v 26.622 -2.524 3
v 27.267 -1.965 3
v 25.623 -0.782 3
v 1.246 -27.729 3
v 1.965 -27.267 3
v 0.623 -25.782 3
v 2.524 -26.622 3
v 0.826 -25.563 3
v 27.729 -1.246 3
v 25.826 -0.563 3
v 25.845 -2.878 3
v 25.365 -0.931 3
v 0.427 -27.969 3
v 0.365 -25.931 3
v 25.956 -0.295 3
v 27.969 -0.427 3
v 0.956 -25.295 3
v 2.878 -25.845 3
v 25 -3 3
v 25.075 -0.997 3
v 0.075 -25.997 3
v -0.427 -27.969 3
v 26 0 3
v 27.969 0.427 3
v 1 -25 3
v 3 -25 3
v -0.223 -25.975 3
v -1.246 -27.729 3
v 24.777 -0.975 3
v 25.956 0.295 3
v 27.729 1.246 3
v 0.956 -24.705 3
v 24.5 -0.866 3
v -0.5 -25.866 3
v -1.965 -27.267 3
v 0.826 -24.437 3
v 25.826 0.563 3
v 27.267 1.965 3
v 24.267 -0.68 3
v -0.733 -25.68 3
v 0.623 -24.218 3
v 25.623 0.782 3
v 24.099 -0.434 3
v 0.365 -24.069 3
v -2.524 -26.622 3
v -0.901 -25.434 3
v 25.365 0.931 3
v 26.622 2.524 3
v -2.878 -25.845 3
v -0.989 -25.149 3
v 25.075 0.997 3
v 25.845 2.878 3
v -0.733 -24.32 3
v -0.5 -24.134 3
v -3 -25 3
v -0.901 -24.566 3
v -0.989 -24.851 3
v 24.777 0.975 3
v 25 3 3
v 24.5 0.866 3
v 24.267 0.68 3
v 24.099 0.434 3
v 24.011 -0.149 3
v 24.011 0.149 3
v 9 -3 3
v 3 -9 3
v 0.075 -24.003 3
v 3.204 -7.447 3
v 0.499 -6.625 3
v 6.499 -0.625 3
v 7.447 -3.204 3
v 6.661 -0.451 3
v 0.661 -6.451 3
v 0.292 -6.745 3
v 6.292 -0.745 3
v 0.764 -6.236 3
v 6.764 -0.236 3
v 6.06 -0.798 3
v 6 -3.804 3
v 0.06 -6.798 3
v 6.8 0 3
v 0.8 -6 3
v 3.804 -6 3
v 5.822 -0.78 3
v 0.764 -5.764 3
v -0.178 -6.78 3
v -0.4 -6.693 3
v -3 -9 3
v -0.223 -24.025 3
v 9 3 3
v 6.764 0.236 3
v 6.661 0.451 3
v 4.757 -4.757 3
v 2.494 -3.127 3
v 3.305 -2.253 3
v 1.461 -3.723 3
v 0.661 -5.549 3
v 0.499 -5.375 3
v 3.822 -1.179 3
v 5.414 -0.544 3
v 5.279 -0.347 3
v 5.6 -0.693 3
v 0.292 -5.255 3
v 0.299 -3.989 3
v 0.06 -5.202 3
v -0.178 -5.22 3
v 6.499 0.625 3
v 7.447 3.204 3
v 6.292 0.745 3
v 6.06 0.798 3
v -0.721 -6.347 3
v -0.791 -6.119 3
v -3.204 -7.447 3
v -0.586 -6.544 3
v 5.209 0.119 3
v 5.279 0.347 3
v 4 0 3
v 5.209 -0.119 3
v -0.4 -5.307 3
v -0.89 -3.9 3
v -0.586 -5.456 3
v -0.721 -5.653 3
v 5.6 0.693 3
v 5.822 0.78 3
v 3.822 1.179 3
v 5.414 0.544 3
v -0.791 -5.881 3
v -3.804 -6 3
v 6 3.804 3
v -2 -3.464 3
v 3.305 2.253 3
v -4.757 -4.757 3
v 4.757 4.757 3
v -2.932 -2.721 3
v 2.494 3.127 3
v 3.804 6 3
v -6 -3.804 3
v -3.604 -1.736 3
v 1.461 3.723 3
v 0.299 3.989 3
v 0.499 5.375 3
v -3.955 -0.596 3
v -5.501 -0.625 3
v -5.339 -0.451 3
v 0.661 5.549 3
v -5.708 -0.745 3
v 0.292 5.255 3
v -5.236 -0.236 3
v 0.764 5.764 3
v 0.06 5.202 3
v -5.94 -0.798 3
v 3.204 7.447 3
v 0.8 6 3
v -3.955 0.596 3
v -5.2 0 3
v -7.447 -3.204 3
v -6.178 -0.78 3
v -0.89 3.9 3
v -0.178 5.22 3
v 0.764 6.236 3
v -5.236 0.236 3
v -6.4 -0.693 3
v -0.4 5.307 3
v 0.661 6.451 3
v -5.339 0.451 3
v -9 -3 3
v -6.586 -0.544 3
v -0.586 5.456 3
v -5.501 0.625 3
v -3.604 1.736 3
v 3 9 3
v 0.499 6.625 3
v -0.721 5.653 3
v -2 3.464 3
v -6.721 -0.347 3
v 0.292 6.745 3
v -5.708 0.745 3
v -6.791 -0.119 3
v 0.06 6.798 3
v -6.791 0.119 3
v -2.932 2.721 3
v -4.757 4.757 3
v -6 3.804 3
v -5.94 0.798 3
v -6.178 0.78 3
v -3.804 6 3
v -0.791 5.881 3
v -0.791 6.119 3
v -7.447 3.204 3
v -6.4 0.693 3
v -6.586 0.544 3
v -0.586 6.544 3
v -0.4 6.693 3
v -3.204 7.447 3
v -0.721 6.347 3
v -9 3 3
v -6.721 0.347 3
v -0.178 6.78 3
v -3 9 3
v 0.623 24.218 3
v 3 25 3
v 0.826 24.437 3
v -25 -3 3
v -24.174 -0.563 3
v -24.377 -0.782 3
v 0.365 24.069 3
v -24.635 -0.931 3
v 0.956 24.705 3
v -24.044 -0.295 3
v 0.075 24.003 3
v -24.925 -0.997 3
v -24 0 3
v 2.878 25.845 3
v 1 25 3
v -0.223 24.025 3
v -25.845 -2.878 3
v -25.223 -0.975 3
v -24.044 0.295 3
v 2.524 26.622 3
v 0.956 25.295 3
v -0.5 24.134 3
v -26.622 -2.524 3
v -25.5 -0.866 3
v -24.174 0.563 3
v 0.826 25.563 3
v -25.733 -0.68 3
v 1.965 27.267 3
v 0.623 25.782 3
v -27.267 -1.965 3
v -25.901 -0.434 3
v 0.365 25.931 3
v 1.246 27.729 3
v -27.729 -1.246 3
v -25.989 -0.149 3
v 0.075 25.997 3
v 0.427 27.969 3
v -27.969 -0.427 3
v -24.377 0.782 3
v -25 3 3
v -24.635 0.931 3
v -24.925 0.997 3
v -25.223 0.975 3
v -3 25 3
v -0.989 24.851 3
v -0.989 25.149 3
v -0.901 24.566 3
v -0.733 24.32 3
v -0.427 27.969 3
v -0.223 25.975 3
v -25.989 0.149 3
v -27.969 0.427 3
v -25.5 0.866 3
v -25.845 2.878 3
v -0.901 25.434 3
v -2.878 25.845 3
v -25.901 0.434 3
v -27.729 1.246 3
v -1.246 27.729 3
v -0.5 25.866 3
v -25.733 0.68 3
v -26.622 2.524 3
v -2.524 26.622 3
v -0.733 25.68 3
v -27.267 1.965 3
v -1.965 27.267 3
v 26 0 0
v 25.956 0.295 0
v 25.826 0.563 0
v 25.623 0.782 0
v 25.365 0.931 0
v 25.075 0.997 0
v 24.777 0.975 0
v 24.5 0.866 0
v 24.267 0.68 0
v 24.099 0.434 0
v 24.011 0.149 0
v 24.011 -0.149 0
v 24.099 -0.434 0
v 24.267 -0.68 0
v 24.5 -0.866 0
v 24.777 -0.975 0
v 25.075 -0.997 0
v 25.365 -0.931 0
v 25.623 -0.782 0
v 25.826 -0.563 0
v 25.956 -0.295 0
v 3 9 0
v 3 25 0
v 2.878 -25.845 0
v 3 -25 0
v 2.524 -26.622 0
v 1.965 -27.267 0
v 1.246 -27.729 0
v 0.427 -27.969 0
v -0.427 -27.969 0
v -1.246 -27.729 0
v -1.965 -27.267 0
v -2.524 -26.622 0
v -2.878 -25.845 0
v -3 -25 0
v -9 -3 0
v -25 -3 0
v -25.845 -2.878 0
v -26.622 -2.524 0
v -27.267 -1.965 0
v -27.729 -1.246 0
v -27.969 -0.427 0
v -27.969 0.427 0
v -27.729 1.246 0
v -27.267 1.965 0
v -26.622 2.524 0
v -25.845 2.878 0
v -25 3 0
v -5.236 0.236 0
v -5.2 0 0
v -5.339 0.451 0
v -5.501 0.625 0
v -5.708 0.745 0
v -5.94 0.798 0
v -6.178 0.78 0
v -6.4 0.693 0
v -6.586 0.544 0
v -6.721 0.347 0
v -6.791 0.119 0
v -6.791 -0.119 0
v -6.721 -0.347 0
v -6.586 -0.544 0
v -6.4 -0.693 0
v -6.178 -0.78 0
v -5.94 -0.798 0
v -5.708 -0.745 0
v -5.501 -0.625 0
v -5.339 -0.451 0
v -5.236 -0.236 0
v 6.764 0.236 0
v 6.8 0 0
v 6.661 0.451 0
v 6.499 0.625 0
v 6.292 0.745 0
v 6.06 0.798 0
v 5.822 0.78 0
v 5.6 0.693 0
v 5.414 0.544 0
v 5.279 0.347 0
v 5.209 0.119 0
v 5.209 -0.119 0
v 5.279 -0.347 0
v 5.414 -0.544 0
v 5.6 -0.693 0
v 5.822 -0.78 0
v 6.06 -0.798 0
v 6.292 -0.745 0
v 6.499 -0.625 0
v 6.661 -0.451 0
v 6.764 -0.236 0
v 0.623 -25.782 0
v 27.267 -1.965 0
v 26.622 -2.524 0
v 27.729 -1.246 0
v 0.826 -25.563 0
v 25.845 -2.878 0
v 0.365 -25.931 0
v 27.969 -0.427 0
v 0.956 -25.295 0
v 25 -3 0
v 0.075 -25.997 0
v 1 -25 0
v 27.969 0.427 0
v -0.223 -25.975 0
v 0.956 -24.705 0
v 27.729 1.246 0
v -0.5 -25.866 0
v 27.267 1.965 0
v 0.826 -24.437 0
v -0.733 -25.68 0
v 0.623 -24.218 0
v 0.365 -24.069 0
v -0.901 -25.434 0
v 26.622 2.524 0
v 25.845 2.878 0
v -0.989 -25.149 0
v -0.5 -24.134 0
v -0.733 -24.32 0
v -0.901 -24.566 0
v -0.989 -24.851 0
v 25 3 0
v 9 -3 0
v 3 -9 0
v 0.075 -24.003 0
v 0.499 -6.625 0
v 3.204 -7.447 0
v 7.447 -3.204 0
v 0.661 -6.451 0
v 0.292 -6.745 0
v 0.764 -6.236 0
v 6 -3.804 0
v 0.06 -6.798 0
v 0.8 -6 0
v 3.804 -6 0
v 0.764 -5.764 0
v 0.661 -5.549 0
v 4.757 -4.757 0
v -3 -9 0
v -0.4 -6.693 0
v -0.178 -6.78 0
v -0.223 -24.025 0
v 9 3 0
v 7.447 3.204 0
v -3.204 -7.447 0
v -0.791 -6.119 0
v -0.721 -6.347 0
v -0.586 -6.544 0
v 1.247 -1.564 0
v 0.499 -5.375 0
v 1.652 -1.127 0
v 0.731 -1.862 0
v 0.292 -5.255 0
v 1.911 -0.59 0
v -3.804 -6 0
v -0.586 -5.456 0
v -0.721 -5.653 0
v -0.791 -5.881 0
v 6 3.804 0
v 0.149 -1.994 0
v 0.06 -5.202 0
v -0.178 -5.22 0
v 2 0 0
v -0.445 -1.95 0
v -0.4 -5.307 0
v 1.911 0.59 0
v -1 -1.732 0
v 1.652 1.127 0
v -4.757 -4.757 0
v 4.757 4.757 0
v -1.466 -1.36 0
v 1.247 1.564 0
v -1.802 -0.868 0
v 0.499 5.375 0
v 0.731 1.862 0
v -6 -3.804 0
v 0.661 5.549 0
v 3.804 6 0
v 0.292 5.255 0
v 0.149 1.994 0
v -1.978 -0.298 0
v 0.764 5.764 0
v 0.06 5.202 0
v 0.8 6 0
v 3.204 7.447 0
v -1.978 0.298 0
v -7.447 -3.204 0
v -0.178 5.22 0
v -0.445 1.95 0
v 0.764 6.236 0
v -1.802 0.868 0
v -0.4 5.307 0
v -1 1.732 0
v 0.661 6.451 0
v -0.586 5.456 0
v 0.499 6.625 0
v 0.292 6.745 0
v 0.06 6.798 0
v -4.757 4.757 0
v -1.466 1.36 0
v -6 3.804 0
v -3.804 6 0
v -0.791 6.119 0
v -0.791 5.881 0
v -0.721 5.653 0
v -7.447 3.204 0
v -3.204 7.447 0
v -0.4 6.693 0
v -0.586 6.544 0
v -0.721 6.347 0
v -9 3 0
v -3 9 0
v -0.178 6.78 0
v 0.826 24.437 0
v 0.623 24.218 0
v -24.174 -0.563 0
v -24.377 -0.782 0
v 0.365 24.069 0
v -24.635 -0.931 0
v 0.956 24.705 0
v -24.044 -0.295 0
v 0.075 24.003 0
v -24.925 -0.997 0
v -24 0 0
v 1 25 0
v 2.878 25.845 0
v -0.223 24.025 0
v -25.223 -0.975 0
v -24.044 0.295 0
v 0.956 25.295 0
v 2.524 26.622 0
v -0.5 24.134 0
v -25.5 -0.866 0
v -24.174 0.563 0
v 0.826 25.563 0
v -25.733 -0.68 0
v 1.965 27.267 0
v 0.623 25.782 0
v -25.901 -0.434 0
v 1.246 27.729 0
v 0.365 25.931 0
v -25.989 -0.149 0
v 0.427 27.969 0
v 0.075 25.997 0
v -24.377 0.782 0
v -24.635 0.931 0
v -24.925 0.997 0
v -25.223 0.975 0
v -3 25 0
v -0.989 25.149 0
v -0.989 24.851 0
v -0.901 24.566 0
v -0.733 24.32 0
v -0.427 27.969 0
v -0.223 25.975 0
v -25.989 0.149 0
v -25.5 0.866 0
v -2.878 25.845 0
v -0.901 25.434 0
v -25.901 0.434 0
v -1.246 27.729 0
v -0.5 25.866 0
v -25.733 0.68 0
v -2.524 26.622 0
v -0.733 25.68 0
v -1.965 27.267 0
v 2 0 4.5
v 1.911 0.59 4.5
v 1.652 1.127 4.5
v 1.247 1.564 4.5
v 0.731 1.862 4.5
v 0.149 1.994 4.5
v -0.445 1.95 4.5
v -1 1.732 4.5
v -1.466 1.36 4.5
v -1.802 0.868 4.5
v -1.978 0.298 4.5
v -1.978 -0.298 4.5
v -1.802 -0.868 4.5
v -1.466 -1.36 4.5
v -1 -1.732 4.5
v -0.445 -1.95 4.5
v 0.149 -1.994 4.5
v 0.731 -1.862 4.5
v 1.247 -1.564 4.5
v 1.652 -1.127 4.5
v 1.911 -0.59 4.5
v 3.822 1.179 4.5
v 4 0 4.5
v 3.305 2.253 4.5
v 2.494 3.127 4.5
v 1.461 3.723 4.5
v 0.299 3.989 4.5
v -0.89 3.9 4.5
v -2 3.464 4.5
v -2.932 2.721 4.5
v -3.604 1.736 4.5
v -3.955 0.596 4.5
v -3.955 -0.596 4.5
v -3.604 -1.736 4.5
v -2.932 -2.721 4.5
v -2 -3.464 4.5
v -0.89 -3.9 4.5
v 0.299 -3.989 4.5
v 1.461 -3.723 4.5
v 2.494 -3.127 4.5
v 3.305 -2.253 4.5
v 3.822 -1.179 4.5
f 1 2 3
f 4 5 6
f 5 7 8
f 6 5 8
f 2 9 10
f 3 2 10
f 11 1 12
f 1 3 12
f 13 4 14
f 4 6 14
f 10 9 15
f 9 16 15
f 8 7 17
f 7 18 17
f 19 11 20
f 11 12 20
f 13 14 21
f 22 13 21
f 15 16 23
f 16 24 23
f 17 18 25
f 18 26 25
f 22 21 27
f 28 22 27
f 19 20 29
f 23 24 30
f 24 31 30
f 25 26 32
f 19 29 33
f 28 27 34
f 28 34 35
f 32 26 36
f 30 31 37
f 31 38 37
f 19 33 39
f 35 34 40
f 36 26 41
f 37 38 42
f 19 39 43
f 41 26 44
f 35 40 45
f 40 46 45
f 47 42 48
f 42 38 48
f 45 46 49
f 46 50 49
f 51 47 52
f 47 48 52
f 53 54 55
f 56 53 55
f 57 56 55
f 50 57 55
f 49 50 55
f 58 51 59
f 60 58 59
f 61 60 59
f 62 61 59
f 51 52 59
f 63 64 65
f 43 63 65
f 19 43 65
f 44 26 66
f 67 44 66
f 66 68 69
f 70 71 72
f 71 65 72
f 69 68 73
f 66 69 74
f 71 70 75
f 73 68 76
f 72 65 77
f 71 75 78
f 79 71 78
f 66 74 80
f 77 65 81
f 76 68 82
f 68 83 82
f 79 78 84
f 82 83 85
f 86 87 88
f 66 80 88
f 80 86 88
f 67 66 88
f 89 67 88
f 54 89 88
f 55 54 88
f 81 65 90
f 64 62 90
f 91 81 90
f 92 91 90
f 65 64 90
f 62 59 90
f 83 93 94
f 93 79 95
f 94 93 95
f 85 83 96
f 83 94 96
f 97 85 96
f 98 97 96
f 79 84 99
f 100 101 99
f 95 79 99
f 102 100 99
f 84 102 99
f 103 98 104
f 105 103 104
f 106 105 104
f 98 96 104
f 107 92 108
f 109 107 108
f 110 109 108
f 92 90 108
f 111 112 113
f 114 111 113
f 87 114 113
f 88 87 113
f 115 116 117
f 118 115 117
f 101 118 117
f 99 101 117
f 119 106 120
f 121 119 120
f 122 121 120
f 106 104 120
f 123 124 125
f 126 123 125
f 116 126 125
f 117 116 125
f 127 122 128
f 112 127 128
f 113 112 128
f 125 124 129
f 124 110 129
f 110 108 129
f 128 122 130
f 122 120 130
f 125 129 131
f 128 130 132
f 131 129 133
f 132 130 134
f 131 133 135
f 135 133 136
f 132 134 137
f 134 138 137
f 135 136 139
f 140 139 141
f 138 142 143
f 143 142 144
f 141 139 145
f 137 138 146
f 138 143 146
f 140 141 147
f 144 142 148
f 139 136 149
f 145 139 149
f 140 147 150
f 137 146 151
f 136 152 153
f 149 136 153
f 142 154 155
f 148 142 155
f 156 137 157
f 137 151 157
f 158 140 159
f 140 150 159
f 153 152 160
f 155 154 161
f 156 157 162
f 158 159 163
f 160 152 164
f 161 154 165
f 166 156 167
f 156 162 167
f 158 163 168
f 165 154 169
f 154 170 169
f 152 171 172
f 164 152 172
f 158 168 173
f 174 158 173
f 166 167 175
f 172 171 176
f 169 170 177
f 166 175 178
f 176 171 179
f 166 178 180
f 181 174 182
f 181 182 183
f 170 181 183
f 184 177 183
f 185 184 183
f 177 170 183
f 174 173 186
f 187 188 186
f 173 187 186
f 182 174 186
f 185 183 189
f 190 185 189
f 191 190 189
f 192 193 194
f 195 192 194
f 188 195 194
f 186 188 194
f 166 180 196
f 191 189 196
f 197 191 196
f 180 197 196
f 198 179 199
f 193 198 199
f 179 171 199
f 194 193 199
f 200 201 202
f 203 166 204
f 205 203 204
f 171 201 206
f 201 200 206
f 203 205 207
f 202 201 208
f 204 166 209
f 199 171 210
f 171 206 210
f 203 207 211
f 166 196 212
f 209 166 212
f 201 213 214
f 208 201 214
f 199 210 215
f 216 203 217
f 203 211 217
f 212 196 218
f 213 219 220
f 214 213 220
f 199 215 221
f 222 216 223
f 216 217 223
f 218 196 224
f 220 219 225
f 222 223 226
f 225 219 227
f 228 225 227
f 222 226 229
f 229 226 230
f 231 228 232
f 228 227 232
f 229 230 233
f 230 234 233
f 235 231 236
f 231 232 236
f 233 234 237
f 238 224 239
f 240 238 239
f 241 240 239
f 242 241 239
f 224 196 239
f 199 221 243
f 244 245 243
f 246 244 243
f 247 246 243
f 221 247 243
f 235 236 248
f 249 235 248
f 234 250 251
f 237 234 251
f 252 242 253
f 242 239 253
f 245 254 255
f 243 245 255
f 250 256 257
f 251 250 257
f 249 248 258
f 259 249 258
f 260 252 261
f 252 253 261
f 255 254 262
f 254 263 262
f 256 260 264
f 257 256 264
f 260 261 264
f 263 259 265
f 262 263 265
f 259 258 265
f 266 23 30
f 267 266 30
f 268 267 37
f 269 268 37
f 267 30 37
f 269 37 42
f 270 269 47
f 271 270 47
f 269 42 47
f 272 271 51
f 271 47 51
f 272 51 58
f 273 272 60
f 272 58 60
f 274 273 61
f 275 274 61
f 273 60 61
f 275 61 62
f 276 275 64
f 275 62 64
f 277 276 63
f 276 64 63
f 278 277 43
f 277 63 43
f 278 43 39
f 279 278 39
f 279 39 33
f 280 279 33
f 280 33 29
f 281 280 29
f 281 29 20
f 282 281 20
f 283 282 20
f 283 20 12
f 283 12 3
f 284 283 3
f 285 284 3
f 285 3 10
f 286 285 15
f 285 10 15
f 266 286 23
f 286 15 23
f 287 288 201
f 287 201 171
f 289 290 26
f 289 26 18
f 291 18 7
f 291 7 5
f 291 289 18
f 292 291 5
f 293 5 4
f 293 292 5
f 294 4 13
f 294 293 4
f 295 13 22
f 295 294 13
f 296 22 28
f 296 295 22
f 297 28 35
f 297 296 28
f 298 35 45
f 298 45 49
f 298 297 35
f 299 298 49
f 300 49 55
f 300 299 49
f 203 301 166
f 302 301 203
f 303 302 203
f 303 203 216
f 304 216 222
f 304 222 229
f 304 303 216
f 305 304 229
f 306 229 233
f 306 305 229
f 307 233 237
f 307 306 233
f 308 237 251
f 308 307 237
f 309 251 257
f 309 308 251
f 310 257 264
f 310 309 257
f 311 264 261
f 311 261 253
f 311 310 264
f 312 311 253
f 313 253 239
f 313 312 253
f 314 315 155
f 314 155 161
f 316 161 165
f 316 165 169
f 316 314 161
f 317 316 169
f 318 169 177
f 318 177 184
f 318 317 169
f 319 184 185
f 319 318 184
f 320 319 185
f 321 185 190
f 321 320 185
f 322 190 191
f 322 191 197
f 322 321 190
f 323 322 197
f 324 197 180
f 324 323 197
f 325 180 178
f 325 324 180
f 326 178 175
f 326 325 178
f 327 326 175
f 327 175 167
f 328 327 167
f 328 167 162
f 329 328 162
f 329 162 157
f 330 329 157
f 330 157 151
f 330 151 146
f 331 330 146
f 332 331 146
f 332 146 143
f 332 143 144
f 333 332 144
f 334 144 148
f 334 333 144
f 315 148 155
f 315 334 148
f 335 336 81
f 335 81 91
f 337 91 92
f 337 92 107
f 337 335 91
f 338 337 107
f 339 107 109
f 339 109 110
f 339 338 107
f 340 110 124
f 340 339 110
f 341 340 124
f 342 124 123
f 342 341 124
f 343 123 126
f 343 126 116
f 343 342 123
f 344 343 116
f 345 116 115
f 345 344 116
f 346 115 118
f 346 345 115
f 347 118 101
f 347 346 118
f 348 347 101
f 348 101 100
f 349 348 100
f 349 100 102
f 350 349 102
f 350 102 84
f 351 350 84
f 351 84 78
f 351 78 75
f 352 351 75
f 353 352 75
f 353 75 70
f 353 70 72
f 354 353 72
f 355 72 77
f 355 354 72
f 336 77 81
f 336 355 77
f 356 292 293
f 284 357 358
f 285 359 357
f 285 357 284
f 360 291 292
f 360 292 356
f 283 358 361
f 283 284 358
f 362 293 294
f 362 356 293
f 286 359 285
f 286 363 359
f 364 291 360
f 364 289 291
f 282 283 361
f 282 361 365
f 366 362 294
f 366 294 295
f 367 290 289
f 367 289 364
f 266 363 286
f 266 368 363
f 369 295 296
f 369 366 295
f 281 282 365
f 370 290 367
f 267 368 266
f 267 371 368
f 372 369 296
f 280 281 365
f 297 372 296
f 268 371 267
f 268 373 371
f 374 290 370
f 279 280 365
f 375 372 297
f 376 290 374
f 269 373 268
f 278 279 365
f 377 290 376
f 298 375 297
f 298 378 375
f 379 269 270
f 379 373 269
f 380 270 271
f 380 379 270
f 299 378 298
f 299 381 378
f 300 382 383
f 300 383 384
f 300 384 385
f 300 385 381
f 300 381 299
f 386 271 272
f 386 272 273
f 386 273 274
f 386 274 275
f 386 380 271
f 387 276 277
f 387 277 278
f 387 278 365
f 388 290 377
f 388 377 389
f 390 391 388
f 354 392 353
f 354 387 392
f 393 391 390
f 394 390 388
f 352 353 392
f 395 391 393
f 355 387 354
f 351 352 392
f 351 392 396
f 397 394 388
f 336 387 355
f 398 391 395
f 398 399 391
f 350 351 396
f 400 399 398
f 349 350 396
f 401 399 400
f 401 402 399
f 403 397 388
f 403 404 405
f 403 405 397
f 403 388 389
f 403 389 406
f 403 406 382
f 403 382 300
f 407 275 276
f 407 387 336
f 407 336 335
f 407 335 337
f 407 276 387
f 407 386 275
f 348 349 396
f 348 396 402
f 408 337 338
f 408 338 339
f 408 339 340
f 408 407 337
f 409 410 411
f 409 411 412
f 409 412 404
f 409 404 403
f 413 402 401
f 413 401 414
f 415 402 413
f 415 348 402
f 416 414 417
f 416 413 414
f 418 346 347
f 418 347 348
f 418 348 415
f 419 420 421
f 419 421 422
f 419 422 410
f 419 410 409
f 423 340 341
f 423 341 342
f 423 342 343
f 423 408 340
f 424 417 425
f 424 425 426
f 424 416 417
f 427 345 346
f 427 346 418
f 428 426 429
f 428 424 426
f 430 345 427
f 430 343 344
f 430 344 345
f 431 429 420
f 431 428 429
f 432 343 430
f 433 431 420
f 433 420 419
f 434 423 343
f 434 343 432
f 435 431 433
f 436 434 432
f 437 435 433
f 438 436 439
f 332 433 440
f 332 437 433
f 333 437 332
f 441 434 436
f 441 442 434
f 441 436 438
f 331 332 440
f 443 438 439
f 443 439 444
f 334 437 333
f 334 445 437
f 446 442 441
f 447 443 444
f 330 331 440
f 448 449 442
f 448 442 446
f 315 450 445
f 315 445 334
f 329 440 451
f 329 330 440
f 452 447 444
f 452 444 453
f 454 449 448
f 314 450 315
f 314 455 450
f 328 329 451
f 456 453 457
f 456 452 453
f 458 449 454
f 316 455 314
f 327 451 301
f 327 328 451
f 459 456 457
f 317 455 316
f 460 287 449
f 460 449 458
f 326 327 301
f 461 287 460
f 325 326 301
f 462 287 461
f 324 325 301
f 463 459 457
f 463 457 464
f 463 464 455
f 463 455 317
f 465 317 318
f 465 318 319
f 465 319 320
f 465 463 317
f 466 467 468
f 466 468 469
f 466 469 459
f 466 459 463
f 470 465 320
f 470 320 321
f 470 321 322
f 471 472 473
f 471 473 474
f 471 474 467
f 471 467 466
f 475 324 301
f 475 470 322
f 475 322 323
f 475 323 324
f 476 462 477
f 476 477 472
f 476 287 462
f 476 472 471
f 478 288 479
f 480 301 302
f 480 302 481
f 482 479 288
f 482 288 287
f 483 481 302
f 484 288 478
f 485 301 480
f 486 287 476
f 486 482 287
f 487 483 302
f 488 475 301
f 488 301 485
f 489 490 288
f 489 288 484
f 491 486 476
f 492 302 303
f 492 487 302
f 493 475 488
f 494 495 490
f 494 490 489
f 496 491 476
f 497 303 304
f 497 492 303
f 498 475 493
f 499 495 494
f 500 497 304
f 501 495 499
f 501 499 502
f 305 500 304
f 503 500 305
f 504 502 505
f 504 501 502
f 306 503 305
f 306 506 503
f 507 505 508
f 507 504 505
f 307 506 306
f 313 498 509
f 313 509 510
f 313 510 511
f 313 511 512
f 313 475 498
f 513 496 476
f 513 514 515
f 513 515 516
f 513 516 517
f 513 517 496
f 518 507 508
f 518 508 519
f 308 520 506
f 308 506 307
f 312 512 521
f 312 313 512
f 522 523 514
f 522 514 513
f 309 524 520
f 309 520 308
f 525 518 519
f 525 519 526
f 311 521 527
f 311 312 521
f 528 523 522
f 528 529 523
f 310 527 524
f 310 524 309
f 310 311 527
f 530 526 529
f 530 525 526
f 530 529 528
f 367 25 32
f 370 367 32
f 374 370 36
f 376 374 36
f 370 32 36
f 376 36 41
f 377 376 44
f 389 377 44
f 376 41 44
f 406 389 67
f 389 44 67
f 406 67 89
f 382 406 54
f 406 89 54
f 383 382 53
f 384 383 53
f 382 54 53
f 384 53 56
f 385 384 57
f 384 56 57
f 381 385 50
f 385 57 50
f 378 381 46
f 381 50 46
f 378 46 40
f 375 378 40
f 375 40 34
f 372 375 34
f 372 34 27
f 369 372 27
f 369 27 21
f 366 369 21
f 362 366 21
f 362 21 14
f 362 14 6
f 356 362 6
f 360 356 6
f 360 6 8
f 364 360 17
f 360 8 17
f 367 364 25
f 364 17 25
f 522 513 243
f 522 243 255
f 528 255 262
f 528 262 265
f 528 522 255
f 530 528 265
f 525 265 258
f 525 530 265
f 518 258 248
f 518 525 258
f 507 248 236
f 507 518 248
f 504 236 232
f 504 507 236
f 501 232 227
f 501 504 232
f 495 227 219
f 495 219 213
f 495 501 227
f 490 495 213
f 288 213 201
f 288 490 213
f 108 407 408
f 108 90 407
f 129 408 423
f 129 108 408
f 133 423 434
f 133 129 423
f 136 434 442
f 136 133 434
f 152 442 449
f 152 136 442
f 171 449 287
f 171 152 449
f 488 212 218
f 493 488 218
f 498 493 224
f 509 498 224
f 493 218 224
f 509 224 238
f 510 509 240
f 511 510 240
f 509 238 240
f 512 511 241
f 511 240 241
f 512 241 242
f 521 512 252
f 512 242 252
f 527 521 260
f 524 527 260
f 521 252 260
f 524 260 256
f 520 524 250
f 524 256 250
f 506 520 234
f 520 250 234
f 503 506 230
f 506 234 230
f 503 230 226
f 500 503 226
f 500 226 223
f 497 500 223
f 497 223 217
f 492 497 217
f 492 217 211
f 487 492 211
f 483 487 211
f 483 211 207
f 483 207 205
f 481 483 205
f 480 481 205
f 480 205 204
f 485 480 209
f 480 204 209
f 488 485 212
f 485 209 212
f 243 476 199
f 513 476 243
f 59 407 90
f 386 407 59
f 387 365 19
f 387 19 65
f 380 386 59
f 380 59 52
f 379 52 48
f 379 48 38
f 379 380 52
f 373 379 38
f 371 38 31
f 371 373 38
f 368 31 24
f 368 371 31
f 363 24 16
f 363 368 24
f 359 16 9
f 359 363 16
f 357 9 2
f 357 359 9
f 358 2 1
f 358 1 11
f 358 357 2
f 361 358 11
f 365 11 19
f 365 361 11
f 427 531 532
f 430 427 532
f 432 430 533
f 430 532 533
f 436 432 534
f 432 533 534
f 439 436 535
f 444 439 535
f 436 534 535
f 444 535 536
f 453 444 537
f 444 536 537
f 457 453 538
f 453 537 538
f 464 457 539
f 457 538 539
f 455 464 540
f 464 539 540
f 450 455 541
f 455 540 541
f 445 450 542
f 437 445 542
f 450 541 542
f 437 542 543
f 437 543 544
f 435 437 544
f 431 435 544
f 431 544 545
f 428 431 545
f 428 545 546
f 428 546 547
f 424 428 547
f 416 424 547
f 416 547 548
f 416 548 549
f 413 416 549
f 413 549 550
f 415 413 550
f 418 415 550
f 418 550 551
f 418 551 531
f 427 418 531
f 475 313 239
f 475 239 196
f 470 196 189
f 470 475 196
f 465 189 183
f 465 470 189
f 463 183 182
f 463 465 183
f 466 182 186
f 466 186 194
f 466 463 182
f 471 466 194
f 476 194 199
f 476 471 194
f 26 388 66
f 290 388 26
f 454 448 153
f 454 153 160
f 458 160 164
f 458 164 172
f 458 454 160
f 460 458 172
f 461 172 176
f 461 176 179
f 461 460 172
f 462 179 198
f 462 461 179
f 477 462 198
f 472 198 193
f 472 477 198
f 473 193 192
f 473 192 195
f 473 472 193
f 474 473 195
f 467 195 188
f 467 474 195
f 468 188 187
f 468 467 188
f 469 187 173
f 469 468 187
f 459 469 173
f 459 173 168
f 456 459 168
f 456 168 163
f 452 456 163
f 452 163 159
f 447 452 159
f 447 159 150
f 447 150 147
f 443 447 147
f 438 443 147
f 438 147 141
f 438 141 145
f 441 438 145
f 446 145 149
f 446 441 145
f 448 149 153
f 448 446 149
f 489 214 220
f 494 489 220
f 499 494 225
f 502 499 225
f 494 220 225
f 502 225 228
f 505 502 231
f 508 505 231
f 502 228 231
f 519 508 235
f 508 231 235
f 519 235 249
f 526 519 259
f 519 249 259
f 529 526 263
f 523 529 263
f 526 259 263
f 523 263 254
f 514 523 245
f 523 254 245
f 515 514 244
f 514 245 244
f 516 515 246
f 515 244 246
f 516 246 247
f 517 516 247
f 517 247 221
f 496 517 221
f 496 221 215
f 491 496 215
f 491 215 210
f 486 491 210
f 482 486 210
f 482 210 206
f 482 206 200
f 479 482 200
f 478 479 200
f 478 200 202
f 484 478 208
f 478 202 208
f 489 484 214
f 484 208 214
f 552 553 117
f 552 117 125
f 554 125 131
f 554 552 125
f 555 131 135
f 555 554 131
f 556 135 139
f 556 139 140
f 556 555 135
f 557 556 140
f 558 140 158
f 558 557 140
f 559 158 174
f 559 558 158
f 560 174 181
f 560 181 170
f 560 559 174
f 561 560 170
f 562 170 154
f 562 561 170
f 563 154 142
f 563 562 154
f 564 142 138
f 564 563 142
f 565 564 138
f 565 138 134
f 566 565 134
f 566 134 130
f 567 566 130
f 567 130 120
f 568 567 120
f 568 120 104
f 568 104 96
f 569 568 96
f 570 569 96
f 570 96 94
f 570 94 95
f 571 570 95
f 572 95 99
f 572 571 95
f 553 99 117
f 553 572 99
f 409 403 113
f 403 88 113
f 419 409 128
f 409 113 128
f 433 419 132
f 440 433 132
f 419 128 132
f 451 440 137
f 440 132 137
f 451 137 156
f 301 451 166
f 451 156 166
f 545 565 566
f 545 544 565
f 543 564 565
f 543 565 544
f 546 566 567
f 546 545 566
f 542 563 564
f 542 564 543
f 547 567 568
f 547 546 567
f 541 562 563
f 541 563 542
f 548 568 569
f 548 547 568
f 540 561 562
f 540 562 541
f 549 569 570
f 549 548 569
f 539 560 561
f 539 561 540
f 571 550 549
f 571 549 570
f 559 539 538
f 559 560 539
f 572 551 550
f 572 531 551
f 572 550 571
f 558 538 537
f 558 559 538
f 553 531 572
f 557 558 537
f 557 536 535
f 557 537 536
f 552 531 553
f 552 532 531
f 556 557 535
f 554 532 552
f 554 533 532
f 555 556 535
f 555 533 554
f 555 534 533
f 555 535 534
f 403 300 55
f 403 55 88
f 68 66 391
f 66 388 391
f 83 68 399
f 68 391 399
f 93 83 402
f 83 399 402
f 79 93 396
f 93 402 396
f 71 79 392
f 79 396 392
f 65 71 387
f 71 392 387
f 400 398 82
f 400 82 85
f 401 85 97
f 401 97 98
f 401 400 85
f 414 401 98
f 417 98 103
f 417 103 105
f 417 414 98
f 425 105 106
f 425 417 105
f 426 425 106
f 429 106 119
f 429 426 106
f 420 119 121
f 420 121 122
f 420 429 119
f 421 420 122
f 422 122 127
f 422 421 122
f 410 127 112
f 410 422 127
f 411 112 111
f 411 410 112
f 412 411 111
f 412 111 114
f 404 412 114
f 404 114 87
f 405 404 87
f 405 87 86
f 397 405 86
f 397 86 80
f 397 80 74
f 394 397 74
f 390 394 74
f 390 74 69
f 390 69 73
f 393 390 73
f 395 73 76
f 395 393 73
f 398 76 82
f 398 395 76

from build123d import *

# Parameters (mm, degrees)
SKETCH1_R           = 0.8
BOSS_EXTRUDE1_DEPTH = 3
FILLET1_R           = 6
SKETCH2_R           = 2
CUT_EXTRUDE1_DEPTH  = 3
BOSS_EXTRUDE2_START = 1.5
SKETCH3_R           = 4
SKETCH3_R_2         = 2
BOSS_EXTRUDE2_DEPTH = 1.5
SKETCH4_R           = 1
CUT_EXTRUDE2_DEPTH  = 3


with BuildPart() as part:
    # Sketch1 → Boss-Extrude1 (new body)
    # profile 1 of 2: a face of its own
    with BuildSketch(Plane.XY):
        with BuildLine():
            Line((25, -3), (-25, -3))
            ThreePointArc((-25, -3), (-28, 0), (-25, 3))
            Line((-25, 3), (25, 3))
            ThreePointArc((25, 3), (28, 0), (25, -3))
        make_face()
        with Locations((-6, 0)):
            Circle(SKETCH1_R, mode=Mode.SUBTRACT)
        with Locations((6, 0)):
            Circle(SKETCH1_R, mode=Mode.SUBTRACT)
    # profile 2 of 2: a face of its own
    with BuildSketch(Plane.XY):
        with BuildLine():
            Line((-3, -25), (-3, 25))
            ThreePointArc((-3, 25), (0, 28), (3, 25))
            Line((3, 25), (3, -25))
            ThreePointArc((3, -25), (0, -28), (-3, -25))
        make_face()
        with Locations((0, 6)):
            Circle(SKETCH1_R, mode=Mode.SUBTRACT)
        with Locations((0, -6)):
            Circle(SKETCH1_R, mode=Mode.SUBTRACT)
    extrude(amount=BOSS_EXTRUDE1_DEPTH)

    # Fillet1
    fillet1_edges = [part.edges().sort_by_distance(p)[0] for p in [
        (3, -3, 1.5),
        (-3, -3, 1.5),
        (-3, 3, 1.5),
        (3, 3, 1.5),
    ]]
    fillet(fillet1_edges, radius=FILLET1_R)

    # Sketch2 → Cut-Extrude1 (cut)
    with BuildSketch(Plane.XY.offset(3)):
        Circle(SKETCH2_R)
    extrude(amount=-CUT_EXTRUDE1_DEPTH, mode=Mode.SUBTRACT)

    # Sketch3 → Boss-Extrude2 (add)
    with BuildSketch(Plane.XY.offset(3).offset(BOSS_EXTRUDE2_START)):
        Circle(SKETCH3_R)
        Circle(SKETCH3_R_2, mode=Mode.SUBTRACT)
    extrude(amount=-BOSS_EXTRUDE2_DEPTH)

    # Sketch4 → Cut-Extrude2 (cut)
    with BuildSketch(Plane.XY.offset(3)):
        with Locations((0, 25)):
            Circle(SKETCH4_R)
        with Locations((25, 0)):
            Circle(SKETCH4_R)
        with Locations((0, -25)):
            Circle(SKETCH4_R)
        with Locations((-25, 0)):
            Circle(SKETCH4_R)
    extrude(amount=-CUT_EXTRUDE2_DEPTH, mode=Mode.SUBTRACT)


solid = part.part
